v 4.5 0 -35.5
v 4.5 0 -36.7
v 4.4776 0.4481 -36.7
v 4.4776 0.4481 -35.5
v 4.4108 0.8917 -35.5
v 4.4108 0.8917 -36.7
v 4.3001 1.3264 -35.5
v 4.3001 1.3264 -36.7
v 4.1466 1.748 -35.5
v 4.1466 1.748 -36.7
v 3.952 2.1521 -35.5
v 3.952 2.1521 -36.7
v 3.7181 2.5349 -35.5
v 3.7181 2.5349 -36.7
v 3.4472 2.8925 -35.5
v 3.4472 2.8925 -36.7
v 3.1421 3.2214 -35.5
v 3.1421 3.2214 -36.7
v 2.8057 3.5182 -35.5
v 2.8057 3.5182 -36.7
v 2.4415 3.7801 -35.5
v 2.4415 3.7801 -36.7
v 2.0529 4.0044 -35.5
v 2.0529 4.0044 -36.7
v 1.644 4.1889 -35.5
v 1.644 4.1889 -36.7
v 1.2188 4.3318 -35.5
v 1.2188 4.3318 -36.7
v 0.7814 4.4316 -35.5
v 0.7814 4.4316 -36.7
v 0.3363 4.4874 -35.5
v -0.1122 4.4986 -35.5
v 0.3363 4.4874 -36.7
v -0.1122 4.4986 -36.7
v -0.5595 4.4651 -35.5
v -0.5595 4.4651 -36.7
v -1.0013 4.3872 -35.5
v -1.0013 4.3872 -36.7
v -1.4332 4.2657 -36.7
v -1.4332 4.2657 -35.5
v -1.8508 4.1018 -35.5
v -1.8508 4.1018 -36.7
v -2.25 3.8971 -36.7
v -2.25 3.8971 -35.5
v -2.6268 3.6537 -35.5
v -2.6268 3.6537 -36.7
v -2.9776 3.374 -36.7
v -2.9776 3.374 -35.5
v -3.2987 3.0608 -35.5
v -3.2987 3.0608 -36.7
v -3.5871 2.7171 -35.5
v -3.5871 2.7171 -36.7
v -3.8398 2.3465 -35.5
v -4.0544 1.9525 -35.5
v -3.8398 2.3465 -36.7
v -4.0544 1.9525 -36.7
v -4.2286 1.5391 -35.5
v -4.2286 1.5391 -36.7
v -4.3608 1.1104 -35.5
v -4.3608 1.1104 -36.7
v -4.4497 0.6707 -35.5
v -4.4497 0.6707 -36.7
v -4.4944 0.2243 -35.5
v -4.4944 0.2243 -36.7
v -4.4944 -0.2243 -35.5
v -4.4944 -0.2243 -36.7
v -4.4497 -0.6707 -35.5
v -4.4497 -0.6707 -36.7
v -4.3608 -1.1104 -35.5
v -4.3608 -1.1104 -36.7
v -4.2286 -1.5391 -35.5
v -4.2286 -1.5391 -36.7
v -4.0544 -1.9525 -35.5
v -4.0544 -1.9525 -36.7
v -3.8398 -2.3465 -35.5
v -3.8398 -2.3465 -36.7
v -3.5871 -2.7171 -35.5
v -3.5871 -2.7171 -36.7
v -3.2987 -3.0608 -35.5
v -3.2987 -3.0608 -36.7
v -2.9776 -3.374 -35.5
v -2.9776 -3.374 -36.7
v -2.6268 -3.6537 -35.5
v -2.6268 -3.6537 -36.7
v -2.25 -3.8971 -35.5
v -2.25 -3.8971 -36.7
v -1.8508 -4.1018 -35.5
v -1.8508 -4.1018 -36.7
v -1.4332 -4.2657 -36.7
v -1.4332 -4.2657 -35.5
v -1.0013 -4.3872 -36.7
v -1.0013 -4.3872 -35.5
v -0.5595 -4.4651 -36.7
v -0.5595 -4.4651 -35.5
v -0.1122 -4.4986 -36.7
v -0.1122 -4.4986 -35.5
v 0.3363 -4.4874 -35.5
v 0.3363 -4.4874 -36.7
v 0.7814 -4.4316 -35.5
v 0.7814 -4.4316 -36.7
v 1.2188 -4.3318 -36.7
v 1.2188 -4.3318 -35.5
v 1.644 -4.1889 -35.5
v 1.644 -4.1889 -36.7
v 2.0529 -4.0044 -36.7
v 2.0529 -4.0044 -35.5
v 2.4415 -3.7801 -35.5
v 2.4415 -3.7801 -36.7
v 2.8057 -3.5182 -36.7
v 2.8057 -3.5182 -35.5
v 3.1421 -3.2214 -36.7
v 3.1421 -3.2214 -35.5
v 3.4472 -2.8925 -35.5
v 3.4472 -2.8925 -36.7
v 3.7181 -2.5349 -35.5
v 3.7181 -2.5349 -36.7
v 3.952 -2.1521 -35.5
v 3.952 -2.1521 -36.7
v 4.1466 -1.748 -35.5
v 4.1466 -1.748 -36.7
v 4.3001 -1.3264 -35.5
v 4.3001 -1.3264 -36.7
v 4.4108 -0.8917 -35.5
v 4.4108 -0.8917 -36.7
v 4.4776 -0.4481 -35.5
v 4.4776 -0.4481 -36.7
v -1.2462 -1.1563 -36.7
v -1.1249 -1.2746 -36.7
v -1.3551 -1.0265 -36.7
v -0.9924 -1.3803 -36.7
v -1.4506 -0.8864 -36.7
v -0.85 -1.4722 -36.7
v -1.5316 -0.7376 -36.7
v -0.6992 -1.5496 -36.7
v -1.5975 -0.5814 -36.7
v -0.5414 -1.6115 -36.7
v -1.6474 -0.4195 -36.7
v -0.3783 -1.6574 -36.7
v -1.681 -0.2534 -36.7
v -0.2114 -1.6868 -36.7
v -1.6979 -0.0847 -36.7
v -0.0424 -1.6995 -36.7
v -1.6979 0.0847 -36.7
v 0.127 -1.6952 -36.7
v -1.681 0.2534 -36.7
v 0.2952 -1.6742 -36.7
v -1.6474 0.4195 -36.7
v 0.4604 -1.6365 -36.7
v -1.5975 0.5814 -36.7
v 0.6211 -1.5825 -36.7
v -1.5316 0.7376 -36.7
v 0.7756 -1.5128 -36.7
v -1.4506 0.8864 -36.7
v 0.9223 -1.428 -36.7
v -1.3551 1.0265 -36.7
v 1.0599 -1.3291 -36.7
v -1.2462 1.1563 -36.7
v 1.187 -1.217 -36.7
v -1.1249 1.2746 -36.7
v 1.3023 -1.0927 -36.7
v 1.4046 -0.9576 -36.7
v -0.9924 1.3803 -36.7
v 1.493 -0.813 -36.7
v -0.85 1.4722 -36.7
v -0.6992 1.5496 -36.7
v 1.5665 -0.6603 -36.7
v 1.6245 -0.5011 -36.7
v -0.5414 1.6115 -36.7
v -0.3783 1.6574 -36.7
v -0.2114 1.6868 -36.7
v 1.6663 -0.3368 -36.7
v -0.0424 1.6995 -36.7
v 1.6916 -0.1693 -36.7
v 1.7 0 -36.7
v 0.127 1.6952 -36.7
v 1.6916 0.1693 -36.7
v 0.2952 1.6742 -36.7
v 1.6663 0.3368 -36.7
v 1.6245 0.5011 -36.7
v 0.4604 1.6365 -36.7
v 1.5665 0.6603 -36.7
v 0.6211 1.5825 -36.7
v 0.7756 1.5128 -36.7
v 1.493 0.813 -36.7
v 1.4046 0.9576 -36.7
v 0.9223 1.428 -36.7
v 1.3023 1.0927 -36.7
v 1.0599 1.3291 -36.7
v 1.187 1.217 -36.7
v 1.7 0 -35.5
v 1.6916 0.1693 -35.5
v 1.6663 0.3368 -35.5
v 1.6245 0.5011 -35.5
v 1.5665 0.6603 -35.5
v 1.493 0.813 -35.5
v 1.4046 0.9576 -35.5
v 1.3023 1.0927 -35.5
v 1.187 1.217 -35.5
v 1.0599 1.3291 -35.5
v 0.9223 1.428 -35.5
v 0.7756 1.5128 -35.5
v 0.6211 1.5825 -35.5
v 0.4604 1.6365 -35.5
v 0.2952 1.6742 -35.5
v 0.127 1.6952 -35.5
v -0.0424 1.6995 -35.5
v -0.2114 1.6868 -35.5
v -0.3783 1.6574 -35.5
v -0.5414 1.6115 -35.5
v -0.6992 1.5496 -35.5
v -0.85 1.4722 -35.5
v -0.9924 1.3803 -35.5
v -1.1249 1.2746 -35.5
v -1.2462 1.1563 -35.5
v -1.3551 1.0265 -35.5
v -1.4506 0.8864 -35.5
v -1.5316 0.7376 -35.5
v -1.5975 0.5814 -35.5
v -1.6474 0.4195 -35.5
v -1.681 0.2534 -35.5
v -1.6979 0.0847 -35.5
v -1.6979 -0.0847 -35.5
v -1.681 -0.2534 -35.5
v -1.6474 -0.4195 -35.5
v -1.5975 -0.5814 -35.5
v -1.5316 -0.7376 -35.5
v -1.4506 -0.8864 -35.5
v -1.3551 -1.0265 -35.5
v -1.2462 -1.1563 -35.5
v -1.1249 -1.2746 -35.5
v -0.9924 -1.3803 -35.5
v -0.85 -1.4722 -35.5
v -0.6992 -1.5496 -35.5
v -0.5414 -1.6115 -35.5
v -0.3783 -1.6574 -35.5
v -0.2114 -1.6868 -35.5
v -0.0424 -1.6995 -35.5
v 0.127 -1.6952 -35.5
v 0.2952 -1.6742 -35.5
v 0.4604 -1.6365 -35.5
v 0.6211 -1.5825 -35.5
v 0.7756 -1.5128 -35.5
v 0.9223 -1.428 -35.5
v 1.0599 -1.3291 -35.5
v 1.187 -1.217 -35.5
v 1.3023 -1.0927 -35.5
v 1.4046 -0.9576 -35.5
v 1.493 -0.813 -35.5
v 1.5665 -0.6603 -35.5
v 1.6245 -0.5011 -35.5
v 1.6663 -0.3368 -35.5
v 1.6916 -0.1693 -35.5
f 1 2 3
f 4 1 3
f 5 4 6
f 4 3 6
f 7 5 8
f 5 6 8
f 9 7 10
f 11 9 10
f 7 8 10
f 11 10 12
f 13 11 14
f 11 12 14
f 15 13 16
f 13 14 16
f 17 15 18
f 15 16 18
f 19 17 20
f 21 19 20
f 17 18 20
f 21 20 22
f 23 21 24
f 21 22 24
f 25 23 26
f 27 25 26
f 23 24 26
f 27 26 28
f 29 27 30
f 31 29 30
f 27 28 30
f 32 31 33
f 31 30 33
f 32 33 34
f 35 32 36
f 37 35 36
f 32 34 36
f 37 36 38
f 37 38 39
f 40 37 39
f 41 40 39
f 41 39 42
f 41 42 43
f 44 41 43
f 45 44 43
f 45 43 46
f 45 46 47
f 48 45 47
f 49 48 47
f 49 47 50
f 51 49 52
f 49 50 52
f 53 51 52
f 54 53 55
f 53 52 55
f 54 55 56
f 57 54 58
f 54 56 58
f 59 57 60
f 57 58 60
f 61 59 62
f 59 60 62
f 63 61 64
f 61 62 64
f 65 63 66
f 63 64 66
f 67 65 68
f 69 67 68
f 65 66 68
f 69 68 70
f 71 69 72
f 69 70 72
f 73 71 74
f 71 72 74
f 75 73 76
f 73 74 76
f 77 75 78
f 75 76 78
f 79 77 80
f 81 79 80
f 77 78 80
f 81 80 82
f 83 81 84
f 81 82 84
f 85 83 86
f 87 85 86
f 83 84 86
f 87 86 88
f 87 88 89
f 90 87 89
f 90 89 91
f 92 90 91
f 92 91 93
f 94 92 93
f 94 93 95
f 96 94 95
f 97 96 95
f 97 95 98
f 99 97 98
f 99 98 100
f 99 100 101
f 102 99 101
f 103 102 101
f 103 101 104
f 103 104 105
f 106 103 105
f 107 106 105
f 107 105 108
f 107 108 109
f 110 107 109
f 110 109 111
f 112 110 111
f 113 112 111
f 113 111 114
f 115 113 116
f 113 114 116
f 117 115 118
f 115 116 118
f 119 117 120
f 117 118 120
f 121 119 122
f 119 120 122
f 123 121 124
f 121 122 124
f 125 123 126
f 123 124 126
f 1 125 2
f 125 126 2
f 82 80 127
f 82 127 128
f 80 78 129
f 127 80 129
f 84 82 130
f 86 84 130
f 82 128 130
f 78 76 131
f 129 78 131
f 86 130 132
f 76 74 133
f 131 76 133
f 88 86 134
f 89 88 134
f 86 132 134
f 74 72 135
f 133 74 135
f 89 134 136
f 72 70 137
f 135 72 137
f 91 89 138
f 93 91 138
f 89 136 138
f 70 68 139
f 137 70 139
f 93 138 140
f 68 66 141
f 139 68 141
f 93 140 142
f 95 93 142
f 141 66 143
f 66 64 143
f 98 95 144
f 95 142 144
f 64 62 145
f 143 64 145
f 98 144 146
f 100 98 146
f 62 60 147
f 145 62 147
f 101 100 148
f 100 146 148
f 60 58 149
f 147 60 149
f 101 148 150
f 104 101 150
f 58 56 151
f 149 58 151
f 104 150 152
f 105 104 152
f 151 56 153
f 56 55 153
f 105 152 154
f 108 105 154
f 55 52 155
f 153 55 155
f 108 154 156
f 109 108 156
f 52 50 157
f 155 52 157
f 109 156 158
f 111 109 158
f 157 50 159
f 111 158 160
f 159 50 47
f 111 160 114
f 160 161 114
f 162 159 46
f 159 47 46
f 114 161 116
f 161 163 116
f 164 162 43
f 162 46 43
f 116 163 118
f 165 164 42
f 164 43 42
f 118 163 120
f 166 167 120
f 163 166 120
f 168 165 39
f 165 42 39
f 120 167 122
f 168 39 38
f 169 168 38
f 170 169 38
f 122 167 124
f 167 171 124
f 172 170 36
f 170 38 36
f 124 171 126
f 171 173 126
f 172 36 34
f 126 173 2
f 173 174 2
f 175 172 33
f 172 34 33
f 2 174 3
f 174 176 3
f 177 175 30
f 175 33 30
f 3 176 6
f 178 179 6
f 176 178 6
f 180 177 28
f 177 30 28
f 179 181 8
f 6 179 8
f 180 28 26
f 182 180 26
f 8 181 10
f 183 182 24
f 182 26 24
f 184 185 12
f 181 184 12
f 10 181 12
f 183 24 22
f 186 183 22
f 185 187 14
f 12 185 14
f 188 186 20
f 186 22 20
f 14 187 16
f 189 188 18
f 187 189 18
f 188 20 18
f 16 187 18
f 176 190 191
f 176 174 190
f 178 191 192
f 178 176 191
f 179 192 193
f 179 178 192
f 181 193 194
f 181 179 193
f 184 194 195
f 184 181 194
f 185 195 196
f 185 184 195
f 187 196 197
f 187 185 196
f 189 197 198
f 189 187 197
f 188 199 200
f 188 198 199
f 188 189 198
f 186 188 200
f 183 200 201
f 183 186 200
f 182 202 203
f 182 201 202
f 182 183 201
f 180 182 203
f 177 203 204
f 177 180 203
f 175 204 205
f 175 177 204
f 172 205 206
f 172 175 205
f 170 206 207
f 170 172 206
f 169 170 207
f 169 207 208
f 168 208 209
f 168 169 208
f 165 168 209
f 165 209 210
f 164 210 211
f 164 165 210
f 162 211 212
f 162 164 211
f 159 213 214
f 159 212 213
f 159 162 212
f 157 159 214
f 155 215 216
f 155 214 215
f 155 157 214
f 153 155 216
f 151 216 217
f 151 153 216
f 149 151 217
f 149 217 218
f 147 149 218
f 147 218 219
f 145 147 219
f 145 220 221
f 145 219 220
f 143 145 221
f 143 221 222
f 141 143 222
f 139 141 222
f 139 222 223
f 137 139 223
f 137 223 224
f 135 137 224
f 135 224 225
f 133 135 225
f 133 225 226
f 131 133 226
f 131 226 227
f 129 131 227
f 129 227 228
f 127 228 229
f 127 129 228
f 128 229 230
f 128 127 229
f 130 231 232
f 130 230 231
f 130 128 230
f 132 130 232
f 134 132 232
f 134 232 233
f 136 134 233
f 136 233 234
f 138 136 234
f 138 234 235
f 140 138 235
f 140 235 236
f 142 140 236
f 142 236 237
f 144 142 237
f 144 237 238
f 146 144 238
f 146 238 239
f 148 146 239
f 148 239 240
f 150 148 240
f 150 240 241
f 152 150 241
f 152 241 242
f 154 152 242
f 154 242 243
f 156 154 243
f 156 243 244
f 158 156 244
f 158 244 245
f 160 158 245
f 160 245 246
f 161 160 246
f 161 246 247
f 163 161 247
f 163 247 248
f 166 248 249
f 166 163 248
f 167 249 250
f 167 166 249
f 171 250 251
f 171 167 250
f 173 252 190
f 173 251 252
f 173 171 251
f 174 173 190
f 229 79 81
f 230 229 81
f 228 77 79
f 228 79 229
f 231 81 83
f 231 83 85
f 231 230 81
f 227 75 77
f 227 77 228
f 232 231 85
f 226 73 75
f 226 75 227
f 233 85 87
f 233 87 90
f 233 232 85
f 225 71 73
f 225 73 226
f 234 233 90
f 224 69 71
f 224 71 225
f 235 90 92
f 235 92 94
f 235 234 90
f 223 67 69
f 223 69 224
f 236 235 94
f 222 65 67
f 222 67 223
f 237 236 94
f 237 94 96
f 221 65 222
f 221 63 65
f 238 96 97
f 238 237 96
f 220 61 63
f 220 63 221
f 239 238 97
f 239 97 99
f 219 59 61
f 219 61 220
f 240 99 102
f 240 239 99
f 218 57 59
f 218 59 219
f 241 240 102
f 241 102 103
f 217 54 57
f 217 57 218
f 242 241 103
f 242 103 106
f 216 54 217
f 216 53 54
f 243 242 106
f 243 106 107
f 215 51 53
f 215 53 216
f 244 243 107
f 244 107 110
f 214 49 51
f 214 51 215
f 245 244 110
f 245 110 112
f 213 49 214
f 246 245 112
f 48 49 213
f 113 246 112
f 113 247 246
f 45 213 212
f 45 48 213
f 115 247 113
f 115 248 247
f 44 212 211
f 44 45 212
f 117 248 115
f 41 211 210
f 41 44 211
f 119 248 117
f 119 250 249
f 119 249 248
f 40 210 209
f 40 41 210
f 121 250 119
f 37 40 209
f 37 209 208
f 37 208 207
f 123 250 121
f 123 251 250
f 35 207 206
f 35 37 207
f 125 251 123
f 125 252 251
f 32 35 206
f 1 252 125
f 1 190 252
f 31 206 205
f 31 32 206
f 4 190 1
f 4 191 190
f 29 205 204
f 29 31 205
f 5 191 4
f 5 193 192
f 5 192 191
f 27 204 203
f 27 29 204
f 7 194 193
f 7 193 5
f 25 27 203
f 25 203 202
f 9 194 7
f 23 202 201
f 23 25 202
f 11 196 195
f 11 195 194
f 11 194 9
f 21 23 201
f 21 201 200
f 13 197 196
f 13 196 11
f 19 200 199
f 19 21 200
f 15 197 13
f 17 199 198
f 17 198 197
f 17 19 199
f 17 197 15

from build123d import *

# Parameters (mm, degrees)
F_0102_CYLINDER_SKETCH_R = 4.5
F_0102_CYLINDER_DEPTH    = 1.2
F_0104_CYLINDER_SKETCH_R = 1.7
F_0104_CYLINDER_DEPTH    = 2


with BuildPart() as part:
    # 0102_cylinder_Sketch → 0102_cylinder (new body)
    with BuildSketch(Plane.XY):
        Circle(F_0102_CYLINDER_SKETCH_R)
    extrude(amount=F_0102_CYLINDER_DEPTH)


with BuildPart() as part_1:
    # 0102_cylinder_Translate: moved
    add(part.part.moved(Location((0, 0, -36.7))))


with BuildPart() as body_2:
    # 0104_cylinder_Sketch → 0104_cylinder (new body)
    with BuildSketch(Plane.XY):
        Circle(F_0104_CYLINDER_SKETCH_R)
    extrude(amount=F_0104_CYLINDER_DEPTH)


with BuildPart() as body_2_1:
    # 0104_cylinder_Translate: moved
    add(body_2.part.moved(Location((0, 0, -37))))


with BuildPart() as part_2:
    add(part_1.part)

    # 0106_sub: cut body 2
    add(body_2_1.part, mode=Mode.SUBTRACT)


solid = part_2.part
